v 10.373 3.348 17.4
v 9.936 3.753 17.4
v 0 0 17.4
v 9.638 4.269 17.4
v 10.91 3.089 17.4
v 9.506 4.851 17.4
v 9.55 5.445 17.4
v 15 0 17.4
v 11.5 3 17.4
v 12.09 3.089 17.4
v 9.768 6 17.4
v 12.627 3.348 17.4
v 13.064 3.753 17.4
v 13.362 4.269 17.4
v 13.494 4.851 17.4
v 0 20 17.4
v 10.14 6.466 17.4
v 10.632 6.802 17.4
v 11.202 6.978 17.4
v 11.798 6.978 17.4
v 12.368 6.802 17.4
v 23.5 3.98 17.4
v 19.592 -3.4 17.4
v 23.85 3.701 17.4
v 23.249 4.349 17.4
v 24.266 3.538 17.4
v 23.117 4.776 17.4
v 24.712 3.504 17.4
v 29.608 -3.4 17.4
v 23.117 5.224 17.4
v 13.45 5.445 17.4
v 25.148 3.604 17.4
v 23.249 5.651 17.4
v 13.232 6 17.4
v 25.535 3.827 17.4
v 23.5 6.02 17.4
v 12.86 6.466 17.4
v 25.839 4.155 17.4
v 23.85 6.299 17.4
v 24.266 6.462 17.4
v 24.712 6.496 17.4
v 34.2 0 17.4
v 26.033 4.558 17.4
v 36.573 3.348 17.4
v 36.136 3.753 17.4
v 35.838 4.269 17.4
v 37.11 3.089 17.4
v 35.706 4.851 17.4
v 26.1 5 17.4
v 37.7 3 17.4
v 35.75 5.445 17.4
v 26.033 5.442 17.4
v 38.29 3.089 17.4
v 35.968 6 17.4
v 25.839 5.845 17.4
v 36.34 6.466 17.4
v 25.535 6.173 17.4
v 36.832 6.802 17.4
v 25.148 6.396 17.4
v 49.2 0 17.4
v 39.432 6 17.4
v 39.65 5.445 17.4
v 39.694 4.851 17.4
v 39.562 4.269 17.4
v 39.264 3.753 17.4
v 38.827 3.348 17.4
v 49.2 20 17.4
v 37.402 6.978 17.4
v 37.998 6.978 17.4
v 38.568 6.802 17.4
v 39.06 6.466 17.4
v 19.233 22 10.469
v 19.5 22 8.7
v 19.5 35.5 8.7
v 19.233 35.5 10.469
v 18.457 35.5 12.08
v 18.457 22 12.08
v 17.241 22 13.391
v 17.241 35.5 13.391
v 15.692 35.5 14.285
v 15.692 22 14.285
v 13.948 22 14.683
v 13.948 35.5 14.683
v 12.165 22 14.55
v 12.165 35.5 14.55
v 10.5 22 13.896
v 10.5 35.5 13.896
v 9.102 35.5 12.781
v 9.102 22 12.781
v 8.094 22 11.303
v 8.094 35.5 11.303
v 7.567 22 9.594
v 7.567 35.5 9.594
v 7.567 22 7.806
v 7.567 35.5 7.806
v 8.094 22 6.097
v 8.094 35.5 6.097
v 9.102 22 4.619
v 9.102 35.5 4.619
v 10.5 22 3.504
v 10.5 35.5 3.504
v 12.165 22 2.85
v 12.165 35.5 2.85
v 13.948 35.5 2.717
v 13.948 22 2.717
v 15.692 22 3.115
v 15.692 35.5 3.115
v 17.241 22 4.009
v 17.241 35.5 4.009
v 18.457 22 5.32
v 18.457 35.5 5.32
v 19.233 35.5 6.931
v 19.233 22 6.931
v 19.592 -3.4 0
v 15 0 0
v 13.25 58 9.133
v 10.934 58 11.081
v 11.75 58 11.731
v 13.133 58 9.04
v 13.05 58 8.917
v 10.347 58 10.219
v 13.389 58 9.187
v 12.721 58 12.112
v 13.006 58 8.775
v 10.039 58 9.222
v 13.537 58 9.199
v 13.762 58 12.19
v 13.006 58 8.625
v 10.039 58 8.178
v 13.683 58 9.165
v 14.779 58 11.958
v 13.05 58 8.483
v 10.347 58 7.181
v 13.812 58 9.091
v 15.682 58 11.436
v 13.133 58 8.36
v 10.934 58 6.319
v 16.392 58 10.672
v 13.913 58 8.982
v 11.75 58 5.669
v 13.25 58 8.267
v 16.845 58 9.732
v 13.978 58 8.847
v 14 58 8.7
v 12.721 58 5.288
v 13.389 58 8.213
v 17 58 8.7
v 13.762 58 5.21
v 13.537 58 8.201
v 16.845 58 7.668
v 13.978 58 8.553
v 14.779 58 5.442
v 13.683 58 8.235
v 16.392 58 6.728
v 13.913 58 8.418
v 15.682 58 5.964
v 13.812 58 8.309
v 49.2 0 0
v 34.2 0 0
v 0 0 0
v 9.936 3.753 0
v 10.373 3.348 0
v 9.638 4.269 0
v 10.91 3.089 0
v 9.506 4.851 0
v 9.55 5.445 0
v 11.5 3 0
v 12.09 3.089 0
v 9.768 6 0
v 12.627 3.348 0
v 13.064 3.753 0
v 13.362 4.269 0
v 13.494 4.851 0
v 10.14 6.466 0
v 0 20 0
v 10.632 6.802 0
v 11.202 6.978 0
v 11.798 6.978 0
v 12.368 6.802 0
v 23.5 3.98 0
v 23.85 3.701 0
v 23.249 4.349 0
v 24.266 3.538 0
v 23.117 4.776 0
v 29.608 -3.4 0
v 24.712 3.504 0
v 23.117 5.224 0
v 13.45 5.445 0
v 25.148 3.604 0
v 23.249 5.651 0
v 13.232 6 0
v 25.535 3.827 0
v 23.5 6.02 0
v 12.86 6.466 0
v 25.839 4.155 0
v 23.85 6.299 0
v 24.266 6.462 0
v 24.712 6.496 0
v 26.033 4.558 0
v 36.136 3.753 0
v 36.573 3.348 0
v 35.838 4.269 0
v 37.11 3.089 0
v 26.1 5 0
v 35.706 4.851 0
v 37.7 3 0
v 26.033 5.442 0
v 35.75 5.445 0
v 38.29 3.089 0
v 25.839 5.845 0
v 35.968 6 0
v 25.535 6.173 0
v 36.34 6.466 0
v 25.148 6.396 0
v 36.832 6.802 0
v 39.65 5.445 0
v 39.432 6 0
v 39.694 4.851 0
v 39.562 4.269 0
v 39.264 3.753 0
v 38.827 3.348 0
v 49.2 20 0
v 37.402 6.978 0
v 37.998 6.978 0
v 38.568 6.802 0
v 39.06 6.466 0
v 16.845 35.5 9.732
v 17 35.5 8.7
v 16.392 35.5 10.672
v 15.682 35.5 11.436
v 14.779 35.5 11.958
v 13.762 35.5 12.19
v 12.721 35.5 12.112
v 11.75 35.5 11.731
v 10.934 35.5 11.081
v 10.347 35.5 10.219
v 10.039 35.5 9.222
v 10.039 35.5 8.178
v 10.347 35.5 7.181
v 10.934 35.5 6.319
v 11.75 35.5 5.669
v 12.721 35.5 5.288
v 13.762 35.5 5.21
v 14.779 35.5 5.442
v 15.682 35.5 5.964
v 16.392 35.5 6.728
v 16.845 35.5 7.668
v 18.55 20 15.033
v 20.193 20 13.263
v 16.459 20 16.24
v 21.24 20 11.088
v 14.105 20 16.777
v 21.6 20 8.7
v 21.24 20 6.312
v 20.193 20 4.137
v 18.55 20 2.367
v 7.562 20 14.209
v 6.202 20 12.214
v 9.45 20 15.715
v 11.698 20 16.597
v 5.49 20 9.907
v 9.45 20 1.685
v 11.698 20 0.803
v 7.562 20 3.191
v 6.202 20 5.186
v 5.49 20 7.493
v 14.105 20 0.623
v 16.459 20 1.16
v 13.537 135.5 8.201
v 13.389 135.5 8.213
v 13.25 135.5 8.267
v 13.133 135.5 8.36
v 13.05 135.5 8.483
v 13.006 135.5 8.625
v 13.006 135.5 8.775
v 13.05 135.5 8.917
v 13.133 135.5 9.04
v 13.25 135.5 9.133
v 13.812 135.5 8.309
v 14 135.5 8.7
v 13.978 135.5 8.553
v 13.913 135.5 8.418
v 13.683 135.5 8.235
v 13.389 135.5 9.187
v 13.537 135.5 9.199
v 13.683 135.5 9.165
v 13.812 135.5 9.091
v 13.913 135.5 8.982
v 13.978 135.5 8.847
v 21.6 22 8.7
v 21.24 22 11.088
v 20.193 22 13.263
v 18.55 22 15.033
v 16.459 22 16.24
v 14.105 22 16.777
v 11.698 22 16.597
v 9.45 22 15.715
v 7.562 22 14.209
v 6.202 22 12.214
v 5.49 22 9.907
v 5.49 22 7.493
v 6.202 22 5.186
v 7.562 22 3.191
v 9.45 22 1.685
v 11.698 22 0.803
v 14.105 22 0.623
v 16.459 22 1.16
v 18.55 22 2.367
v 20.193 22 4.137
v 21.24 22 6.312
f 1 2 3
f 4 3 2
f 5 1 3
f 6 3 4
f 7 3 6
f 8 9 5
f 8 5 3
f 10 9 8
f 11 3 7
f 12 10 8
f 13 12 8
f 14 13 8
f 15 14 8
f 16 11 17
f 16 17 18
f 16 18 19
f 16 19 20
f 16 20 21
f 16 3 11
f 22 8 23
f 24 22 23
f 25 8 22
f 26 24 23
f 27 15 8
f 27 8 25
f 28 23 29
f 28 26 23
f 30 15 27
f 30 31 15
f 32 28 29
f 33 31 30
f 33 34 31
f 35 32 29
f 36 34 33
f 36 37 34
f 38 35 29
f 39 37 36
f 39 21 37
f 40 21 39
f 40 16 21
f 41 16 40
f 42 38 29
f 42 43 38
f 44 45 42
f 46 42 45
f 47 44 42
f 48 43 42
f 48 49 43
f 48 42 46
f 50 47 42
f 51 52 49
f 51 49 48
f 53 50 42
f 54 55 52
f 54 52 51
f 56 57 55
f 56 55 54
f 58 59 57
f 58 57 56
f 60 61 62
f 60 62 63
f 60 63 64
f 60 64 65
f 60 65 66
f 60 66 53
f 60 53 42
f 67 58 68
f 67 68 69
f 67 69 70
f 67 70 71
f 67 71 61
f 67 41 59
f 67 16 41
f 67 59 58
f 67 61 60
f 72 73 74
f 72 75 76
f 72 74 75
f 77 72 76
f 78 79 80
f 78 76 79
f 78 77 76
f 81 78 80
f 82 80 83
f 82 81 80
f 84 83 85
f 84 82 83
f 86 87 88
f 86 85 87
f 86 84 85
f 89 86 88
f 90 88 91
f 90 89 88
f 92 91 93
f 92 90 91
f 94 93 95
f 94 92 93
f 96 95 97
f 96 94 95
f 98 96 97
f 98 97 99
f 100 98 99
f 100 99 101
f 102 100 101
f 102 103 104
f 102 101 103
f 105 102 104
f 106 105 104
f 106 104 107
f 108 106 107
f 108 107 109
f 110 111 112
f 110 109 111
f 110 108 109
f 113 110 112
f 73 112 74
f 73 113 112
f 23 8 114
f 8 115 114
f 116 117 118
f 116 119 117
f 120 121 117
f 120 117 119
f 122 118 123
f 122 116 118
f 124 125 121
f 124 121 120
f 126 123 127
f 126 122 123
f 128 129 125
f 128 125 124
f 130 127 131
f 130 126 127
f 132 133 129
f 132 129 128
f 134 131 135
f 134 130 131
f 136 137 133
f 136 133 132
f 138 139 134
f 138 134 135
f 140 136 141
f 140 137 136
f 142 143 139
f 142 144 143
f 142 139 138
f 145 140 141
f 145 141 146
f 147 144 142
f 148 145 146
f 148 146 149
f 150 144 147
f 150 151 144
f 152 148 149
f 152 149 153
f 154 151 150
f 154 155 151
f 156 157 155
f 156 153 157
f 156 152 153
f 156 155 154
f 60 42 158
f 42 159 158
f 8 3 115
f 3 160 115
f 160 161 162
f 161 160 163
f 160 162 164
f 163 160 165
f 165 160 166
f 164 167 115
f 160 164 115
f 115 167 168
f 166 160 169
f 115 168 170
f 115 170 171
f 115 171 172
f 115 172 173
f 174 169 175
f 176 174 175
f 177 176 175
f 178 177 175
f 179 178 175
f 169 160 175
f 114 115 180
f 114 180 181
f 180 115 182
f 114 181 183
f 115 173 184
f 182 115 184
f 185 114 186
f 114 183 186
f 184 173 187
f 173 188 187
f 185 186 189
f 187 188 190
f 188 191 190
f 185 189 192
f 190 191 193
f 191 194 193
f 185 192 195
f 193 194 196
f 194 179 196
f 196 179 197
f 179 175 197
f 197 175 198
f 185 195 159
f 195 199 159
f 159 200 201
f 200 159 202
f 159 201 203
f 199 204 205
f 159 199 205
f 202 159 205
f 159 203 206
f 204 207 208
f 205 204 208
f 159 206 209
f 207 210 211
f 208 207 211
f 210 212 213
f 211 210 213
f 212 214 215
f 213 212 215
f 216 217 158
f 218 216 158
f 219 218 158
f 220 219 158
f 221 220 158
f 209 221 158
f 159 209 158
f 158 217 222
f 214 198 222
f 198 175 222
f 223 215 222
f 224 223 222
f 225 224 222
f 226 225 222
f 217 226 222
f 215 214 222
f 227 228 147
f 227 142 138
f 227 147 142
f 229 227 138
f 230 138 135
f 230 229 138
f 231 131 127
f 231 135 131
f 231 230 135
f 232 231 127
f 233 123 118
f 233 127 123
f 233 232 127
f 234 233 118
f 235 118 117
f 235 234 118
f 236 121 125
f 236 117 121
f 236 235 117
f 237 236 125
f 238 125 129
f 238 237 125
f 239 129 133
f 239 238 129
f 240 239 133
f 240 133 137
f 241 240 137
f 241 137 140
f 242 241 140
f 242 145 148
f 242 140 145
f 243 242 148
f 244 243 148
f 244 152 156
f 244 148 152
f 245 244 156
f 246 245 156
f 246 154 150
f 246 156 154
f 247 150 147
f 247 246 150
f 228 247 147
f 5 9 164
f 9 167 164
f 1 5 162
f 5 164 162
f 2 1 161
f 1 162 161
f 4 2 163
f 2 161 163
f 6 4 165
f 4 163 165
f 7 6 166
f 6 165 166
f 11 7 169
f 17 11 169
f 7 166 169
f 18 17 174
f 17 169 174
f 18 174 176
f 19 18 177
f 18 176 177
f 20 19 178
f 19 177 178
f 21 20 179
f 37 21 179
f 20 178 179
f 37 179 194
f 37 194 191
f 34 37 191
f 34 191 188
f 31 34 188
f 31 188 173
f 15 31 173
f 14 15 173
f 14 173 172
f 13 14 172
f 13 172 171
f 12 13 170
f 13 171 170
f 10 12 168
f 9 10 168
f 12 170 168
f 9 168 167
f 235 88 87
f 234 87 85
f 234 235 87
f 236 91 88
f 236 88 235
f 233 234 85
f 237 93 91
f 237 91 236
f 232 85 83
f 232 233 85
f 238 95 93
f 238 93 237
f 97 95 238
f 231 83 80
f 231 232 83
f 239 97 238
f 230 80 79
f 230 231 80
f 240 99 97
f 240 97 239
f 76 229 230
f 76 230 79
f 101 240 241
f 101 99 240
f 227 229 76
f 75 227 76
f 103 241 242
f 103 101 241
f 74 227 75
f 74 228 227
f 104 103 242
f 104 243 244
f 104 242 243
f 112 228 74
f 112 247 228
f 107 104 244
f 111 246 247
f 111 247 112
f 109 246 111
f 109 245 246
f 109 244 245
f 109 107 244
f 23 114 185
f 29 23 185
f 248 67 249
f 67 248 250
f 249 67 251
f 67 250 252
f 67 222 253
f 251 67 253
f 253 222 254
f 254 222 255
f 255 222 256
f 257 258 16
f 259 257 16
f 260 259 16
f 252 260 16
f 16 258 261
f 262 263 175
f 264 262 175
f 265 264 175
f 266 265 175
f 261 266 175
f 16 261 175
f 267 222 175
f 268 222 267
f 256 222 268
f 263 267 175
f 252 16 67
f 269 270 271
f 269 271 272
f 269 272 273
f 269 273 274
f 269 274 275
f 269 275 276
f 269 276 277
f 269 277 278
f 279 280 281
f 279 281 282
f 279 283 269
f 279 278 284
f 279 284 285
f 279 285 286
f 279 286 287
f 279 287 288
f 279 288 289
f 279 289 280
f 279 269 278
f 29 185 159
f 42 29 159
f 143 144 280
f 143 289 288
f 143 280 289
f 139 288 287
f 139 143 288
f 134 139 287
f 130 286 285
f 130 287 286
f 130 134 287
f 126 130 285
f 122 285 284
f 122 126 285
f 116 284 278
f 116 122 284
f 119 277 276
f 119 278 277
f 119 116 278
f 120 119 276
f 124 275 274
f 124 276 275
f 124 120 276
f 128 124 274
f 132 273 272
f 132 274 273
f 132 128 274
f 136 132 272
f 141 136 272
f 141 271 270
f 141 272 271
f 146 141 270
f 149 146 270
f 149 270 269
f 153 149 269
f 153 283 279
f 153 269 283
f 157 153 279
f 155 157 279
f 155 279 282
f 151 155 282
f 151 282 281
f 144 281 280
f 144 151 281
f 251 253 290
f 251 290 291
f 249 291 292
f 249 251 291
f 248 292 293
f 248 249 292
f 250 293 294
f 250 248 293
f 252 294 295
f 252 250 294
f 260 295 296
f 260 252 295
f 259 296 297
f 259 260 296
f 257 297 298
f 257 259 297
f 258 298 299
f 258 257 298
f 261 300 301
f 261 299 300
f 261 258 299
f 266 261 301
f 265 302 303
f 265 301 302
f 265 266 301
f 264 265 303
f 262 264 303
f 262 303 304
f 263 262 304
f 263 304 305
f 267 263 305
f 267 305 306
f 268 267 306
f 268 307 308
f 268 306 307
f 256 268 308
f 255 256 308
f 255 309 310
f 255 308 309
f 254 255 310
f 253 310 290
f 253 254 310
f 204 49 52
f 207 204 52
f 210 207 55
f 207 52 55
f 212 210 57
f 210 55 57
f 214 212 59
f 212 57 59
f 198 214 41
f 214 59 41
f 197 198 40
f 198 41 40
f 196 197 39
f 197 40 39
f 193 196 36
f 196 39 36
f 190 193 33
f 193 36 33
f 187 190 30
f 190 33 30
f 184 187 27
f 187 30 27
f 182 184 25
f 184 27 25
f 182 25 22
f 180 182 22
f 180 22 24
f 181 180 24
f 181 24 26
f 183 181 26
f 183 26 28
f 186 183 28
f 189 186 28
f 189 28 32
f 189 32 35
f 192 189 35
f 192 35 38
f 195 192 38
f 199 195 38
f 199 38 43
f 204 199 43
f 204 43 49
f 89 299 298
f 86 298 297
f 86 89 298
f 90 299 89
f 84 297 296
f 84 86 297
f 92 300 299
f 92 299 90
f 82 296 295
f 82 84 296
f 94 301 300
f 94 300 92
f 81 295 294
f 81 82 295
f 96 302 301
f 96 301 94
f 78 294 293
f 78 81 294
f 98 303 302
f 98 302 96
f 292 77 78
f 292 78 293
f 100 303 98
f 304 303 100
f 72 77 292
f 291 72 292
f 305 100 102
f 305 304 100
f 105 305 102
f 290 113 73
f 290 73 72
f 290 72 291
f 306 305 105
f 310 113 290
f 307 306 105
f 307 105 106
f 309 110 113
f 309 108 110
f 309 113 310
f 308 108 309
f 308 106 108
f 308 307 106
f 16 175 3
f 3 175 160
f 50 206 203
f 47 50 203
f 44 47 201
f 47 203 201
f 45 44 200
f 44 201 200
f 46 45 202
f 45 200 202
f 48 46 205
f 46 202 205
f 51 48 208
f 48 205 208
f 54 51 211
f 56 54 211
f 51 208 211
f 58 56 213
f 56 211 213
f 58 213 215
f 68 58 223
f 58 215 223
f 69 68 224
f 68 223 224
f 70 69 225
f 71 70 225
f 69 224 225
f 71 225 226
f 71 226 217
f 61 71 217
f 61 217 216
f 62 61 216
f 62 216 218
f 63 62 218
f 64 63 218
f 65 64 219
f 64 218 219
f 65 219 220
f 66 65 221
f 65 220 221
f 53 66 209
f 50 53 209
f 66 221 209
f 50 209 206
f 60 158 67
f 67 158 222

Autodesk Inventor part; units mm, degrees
ref_plane "YZ Plane" through (0, 0, 0) normal (1, 0, 0) x (0, 1, 0)
ref_plane "XZ Plane" through (0, 0, 0) normal (0, 1, 0) x (-1, 0, 0)
ref_plane "XY Plane" through (0, 0, 0) normal (0, 0, 1) x (1, 0, 0)
sketch "スケッチ1" plane through (0, 0, 0) normal (0, 0, 1) x (1, 0, 0)
  line L0 (0, 0) -> (49.2, 0)
  line L1 (49.2, 0) -> (49.2, 20)
  line L2 (49.2, 20) -> (0, 20)
  line L3 (0, 20) -> (0, 0)
  line L4 (15, 0) -> (19.5921, -3.4)
  line L5 (19.5921, -3.4) -> (29.6079, -3.4)
  line L6 (29.6079, -3.4) -> (34.2, 0)
  dimension "d0" = 49.2
  dimension "d1" = 20
  dimension "d2" = 15
  dimension "d3" = 15
  dimension "d4" = 3.4
extrude "押し出し1" add sketch "スケッチ1" along normal blind 17.4
sketch "スケッチ2" plane through (0, 20, 0) normal (0, 1, 0) x (1, 0, 0)
  circle A0 centre (13.5, -8.7) radius 8.1
  line L0 (0, 0) -> (0, -17.4) projected
  circle A1 centre (13.5, -8.7) radius 6
  circle A2 centre (13.5, -8.7) radius 3.5
  dimension "d7" = 16.2
  dimension "d8" = 13.5
  dimension "d9" = 12
  dimension "d10" = 7
extrude "押し出し2" add sketch "スケッチ2" along normal blind 2 contours A0
extrude "押し出し3" add sketch "スケッチ2" along normal blind 15.5 contours A1
extrude "押し出し4" add sketch "スケッチ2" along normal blind 38 contours A2
sketch "スケッチ3" plane through (13.5, 58, 8.7) normal (0, 1, 0) x (1, 0, 0)
  circle A0 centre (0, 0) radius 0.5
  point P0 (-13.5, 8.7)
  dimension "d17" = 1
extrude "押し出し5" add sketch "スケッチ3" along normal blind 77.5
sketch "スケッチ4" plane through (0, 0, 17.4) normal (0, 0, 1) x (1, 0, 0)
  line L0 (0, 0) -> (15, 0) projected
  line L1 (34.2, 0) -> (49.2, 0) projected
  line L2 (49.2, 0) -> (49.2, 20) projected
  line L3 (0, 20) -> (0, 0) projected
  point P0 (11.5, 5)
  point P1 (37.7, 5)
  dimension "d20" = 5
  dimension "d21" = 5
  dimension "d22" = 11.5
  dimension "d23" = 11.5
hole "穴1" at (11.5, 5, 17.4) at (37.7, 5, 17.4) direction (0, 0, -1) diameter 4 end through all
sketch "スケッチ5" plane through (0, 0, 17.4) normal (0, 0, 1) x (1, 0, 0)
  circle A0 centre (11.5, 5) radius 2 projected
  circle A1 centre (37.7, 5) radius 2 projected
  line L0 (29.6079, -3.4) -> (34.2, 0) projected
  line L1 (34.2, 0) -> (49.2, 0) projected
  line L2 (49.2, 0) -> (49.2, 20) projected
  line L3 (49.2, 20) -> (0, 20) projected
  line L4 (0, 20) -> (0, 0) projected
  line L5 (0, 0) -> (15, 0) projected
  line L6 (15, 0) -> (19.5921, -3.4) projected
  line L7 (19.5921, -3.4) -> (29.6079, -3.4) projected
  circle A2 centre (24.6, 5) radius 1.5
  dimension "d31" = 3
extrude "押し出し6" cut sketch "スケッチ5" against normal blind 40 contours A2
properties part number "Z-15HNJS55-B" material "ABS プラスチック"
